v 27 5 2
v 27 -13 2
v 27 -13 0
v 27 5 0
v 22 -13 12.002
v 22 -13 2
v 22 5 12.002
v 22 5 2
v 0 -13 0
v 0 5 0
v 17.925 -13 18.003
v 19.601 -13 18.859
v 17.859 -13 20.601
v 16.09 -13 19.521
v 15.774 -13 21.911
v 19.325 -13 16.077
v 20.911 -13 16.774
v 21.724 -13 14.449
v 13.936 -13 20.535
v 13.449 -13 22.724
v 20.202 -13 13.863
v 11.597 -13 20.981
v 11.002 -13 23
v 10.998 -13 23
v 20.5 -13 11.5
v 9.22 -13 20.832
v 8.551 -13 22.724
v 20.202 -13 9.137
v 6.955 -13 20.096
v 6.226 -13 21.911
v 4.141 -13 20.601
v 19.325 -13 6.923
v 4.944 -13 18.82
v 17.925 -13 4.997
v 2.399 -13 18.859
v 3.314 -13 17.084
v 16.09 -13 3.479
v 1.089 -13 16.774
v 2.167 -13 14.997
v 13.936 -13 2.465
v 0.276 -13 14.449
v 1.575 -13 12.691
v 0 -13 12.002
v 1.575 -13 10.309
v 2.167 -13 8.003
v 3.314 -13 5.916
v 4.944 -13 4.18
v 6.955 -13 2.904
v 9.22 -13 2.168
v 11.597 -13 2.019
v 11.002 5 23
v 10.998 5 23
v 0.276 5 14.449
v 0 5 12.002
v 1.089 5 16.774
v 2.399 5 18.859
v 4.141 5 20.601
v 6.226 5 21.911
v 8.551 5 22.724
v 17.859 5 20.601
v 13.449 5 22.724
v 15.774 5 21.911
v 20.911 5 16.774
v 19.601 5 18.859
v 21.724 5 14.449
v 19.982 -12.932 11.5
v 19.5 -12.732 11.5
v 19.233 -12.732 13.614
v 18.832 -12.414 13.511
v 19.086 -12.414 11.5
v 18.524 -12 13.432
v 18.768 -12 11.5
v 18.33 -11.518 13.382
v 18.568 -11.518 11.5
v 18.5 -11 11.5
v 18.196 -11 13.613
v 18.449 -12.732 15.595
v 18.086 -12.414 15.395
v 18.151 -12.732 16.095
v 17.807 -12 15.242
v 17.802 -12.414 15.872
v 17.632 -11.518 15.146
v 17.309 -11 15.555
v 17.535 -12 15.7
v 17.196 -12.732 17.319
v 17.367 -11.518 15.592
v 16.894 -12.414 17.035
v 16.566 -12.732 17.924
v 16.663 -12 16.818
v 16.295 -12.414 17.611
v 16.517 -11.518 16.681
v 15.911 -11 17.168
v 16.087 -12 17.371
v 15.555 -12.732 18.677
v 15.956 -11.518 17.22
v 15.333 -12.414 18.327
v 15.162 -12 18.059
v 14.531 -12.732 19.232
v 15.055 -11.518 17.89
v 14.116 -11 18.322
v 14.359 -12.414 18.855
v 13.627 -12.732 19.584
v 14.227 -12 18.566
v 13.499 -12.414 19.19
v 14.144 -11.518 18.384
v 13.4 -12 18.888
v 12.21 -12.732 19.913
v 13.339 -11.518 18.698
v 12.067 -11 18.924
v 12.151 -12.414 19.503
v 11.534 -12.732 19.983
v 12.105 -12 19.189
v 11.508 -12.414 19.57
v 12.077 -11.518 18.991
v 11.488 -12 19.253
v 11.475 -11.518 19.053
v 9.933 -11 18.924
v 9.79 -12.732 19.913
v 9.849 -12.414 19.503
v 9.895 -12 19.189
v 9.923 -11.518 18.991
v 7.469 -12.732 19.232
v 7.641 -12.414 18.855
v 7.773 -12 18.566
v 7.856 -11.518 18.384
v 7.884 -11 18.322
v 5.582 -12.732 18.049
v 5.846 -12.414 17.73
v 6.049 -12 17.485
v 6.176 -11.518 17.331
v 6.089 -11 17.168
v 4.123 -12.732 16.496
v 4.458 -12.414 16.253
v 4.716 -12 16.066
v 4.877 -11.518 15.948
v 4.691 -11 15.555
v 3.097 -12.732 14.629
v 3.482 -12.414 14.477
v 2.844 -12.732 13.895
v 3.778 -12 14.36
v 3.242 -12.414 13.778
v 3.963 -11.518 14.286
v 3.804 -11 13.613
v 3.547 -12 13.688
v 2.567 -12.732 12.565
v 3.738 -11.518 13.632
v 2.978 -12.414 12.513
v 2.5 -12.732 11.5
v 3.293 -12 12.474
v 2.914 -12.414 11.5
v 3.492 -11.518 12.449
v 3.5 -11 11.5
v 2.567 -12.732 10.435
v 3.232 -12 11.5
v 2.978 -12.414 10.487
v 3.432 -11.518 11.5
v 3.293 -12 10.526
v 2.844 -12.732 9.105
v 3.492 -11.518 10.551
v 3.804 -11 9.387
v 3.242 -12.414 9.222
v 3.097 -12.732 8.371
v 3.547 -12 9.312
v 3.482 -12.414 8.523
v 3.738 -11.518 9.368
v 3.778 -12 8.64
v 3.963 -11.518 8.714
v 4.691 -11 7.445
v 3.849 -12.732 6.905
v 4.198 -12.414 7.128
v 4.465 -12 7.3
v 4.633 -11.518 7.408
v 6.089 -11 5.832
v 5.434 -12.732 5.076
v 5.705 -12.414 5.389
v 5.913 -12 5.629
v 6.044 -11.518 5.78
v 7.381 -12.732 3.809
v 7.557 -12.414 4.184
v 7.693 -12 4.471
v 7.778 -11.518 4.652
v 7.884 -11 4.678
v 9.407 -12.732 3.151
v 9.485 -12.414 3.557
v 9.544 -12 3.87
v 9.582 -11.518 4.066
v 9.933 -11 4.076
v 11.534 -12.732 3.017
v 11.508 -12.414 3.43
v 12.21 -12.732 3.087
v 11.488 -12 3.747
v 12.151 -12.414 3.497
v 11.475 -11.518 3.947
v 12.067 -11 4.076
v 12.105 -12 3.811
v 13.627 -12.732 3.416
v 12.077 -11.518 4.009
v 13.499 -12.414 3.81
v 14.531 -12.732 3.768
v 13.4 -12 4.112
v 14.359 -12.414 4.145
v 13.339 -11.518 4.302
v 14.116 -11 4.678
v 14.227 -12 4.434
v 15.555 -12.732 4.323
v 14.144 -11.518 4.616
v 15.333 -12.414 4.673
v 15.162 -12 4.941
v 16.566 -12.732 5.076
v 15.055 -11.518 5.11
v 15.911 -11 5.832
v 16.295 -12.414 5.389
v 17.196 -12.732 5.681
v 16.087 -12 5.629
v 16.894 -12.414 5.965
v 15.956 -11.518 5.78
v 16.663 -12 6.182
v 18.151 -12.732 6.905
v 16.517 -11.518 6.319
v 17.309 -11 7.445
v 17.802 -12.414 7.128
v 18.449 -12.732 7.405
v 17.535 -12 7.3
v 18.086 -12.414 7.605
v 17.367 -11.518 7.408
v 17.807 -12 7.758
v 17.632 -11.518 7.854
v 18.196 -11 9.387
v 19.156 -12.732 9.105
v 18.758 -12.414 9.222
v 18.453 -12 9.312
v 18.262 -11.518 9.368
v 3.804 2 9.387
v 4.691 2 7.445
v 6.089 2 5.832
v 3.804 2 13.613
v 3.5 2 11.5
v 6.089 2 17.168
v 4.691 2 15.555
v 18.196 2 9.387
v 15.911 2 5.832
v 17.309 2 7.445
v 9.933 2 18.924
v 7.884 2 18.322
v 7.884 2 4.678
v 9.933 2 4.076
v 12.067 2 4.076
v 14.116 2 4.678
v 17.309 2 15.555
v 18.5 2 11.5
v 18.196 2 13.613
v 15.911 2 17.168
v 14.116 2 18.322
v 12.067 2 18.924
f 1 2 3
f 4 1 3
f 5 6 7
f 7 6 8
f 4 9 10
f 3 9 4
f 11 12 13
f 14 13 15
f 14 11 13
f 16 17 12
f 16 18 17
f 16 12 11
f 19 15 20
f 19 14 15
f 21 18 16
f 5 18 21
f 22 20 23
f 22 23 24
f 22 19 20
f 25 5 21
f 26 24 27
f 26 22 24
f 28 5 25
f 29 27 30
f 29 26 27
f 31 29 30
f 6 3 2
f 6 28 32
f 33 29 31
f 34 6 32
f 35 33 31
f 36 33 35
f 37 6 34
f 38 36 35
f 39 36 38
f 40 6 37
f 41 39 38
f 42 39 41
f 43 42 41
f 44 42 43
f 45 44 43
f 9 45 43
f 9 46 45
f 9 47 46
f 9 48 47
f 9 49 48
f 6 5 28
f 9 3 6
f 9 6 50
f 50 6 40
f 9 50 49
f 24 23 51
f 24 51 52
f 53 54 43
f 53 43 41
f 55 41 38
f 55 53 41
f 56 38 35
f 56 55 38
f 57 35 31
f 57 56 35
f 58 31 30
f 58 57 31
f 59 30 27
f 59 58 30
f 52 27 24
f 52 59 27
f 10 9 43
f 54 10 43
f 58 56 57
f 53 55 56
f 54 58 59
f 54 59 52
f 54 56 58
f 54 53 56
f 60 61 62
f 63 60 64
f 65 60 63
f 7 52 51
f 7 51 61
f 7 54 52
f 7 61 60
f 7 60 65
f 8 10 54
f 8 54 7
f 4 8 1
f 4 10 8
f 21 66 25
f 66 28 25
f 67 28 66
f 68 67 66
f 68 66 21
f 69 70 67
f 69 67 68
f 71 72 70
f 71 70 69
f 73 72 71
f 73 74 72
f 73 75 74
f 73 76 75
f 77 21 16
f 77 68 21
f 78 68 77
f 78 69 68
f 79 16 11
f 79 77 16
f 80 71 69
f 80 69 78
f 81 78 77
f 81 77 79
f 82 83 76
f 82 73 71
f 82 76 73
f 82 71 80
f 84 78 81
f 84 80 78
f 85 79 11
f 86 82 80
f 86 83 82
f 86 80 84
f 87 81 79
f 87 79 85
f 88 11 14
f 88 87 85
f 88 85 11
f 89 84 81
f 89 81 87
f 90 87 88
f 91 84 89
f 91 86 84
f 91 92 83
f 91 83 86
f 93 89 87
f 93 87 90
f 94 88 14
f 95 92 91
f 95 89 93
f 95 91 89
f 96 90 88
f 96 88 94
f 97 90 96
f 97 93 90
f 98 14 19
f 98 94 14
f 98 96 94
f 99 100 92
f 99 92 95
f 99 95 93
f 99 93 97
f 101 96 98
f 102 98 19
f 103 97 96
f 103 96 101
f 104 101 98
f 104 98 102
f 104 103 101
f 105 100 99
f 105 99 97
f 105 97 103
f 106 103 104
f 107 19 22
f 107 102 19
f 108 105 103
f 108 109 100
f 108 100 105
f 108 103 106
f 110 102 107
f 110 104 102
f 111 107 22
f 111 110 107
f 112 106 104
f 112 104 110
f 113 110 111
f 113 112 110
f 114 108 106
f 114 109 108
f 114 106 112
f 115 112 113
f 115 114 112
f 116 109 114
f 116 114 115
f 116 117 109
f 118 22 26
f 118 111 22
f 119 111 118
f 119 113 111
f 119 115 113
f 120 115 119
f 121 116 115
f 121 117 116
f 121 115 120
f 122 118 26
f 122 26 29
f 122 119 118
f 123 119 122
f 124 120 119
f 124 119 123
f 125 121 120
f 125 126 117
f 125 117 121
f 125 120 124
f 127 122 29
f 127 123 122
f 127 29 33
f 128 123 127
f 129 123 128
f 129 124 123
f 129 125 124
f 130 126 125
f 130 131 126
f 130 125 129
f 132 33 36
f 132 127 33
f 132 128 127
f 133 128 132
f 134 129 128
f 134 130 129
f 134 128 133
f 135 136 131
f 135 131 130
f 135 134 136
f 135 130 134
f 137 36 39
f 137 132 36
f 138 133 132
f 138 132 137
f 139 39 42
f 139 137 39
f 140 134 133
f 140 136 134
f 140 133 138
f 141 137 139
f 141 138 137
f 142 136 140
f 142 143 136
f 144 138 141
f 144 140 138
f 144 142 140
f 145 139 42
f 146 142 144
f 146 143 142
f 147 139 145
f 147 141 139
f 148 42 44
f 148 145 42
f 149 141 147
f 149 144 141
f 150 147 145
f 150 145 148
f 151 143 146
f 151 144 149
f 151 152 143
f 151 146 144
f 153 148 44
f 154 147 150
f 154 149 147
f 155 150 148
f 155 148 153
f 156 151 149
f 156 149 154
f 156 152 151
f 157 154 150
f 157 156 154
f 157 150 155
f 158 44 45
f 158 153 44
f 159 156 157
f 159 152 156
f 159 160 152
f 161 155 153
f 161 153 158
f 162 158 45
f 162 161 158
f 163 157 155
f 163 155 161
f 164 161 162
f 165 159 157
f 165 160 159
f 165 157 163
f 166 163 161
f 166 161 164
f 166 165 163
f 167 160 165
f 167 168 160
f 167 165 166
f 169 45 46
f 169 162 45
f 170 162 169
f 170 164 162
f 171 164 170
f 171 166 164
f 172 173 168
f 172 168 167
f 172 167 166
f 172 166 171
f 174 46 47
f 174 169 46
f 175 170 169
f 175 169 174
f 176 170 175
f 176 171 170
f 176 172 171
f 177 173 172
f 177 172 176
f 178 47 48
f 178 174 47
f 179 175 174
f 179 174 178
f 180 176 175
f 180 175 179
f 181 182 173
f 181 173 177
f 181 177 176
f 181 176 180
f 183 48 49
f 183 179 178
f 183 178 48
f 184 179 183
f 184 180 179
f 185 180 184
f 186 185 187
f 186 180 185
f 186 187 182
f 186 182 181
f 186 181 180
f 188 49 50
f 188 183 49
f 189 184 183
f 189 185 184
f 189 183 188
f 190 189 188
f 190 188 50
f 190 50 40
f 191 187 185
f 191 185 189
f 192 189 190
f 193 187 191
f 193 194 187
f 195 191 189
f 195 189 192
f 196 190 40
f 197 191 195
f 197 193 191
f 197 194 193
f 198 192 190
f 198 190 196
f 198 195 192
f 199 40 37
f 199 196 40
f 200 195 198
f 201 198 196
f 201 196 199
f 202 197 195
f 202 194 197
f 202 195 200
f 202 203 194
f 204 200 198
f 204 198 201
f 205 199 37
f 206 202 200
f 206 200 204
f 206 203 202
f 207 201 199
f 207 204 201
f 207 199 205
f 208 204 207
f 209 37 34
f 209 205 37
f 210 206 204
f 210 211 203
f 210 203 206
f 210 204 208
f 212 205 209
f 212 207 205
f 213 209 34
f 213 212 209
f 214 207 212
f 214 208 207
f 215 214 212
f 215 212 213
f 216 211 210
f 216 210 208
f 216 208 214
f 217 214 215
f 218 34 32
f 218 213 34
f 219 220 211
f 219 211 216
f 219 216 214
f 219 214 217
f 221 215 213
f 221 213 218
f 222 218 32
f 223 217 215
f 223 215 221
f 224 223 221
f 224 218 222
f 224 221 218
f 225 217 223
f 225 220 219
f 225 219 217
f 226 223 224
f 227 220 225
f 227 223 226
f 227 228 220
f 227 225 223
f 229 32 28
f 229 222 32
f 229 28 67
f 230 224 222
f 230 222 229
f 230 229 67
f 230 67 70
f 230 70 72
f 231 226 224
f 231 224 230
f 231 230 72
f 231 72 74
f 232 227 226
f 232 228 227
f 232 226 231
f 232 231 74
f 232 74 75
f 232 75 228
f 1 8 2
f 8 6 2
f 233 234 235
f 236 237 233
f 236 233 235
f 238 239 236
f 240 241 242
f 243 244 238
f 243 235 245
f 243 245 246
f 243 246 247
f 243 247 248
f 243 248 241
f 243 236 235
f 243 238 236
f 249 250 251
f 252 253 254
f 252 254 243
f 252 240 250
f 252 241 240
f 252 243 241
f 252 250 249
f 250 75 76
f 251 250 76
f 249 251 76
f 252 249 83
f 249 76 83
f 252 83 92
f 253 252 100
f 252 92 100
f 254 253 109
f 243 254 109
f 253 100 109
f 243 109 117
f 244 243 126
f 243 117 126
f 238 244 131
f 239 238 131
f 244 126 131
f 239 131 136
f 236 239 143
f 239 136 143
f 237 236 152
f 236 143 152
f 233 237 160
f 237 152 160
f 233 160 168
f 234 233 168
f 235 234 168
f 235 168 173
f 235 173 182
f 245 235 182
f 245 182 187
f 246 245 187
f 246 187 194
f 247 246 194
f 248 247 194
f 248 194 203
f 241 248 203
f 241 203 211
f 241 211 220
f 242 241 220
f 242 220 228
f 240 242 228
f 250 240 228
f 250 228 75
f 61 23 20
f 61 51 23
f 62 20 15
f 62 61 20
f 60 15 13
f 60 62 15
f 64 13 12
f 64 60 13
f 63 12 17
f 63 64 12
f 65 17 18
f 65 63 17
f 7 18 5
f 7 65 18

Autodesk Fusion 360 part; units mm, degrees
sketch "Sketch1" plane through (0, 0, 0) normal (0, 0, 1) x (1, 0, 0)
  line L0 (0, 0) -> (27, 0)
  line L1 (27, 0) -> (27, -13)
  line L2 (27, -13) -> (0, -13)
  line L3 (0, -13) -> (0, 0)
  dimension "d1" = 27
  dimension "d2" = 13
extrude "Extrude1" add sketch "Sketch1" along normal blind 0.5
extrude "Extrude2" add 1 faces at (9, -8.6667, 0.5) along direction (0, 0, 1) blind 1.5
sketch "Sketch2" plane through (0, 0, 2) normal (0, 0, 1) x (-1, 0, 0)
  line L0 (0, 13) -> (-27, 13)
  line L1 (-27, 13) -> (-27, 0)
  line L2 (-27, 0) -> (0, 0)
  line L3 (0, 0) -> (0, 13)
  line L4 (0, 13) -> (-22, 13)
  line L5 (-22, 13) -> (-22, -5)
  line L6 (-22, -5) -> (0, -5)
  line L7 (0, -5) -> (0, 13)
  dimension "d7" = 22
  dimension "d8" = 18
extrude "Extrude3" add sketch "Sketch2" along normal blind 21 contours L0 L2 L3 L4 L5 L7 | L2 L5 L6 L7
extrude "Extrude4" add 1 faces at (16.3333, 0, 0.6667) along direction (0, 1, 0) blind 5
sketch "Sketch3" plane through (0, -13, 0) normal (0, -1, 0) x (1, 0, 0)
  line L0 (0, 0) -> (27, 0)
  line L1 (27, 0) -> (27, 2)
  line L2 (27, 2) -> (22, 2)
  line L3 (22, 2) -> (22, 23)
  line L4 (22, 23) -> (0, 23)
  line L5 (0, 23) -> (0, 0)
  circle A0 centre (11, 11.5) radius 7.5
  line L6 (0, 2) -> (22, 2) construction
  line L7 (27.4979, -2) -> (0.4979, -2) construction
  line L8 (-1.5021, 4) -> (29.4979, 4) construction
  dimension "d13" = 15
  dimension "d14" = 6
  dimension "d15" = 7.5
  dimension "d16" = 11
extrude "Extrude5" cut sketch "Sketch3" against normal blind 15 contours A0
fillet "Fillet1" radius 11 2 edges at (22, -4, 23) (0, -4, 23)
fillet "Fillet2" radius 2 1 edges at (4.0075, -13, 14.2121)
